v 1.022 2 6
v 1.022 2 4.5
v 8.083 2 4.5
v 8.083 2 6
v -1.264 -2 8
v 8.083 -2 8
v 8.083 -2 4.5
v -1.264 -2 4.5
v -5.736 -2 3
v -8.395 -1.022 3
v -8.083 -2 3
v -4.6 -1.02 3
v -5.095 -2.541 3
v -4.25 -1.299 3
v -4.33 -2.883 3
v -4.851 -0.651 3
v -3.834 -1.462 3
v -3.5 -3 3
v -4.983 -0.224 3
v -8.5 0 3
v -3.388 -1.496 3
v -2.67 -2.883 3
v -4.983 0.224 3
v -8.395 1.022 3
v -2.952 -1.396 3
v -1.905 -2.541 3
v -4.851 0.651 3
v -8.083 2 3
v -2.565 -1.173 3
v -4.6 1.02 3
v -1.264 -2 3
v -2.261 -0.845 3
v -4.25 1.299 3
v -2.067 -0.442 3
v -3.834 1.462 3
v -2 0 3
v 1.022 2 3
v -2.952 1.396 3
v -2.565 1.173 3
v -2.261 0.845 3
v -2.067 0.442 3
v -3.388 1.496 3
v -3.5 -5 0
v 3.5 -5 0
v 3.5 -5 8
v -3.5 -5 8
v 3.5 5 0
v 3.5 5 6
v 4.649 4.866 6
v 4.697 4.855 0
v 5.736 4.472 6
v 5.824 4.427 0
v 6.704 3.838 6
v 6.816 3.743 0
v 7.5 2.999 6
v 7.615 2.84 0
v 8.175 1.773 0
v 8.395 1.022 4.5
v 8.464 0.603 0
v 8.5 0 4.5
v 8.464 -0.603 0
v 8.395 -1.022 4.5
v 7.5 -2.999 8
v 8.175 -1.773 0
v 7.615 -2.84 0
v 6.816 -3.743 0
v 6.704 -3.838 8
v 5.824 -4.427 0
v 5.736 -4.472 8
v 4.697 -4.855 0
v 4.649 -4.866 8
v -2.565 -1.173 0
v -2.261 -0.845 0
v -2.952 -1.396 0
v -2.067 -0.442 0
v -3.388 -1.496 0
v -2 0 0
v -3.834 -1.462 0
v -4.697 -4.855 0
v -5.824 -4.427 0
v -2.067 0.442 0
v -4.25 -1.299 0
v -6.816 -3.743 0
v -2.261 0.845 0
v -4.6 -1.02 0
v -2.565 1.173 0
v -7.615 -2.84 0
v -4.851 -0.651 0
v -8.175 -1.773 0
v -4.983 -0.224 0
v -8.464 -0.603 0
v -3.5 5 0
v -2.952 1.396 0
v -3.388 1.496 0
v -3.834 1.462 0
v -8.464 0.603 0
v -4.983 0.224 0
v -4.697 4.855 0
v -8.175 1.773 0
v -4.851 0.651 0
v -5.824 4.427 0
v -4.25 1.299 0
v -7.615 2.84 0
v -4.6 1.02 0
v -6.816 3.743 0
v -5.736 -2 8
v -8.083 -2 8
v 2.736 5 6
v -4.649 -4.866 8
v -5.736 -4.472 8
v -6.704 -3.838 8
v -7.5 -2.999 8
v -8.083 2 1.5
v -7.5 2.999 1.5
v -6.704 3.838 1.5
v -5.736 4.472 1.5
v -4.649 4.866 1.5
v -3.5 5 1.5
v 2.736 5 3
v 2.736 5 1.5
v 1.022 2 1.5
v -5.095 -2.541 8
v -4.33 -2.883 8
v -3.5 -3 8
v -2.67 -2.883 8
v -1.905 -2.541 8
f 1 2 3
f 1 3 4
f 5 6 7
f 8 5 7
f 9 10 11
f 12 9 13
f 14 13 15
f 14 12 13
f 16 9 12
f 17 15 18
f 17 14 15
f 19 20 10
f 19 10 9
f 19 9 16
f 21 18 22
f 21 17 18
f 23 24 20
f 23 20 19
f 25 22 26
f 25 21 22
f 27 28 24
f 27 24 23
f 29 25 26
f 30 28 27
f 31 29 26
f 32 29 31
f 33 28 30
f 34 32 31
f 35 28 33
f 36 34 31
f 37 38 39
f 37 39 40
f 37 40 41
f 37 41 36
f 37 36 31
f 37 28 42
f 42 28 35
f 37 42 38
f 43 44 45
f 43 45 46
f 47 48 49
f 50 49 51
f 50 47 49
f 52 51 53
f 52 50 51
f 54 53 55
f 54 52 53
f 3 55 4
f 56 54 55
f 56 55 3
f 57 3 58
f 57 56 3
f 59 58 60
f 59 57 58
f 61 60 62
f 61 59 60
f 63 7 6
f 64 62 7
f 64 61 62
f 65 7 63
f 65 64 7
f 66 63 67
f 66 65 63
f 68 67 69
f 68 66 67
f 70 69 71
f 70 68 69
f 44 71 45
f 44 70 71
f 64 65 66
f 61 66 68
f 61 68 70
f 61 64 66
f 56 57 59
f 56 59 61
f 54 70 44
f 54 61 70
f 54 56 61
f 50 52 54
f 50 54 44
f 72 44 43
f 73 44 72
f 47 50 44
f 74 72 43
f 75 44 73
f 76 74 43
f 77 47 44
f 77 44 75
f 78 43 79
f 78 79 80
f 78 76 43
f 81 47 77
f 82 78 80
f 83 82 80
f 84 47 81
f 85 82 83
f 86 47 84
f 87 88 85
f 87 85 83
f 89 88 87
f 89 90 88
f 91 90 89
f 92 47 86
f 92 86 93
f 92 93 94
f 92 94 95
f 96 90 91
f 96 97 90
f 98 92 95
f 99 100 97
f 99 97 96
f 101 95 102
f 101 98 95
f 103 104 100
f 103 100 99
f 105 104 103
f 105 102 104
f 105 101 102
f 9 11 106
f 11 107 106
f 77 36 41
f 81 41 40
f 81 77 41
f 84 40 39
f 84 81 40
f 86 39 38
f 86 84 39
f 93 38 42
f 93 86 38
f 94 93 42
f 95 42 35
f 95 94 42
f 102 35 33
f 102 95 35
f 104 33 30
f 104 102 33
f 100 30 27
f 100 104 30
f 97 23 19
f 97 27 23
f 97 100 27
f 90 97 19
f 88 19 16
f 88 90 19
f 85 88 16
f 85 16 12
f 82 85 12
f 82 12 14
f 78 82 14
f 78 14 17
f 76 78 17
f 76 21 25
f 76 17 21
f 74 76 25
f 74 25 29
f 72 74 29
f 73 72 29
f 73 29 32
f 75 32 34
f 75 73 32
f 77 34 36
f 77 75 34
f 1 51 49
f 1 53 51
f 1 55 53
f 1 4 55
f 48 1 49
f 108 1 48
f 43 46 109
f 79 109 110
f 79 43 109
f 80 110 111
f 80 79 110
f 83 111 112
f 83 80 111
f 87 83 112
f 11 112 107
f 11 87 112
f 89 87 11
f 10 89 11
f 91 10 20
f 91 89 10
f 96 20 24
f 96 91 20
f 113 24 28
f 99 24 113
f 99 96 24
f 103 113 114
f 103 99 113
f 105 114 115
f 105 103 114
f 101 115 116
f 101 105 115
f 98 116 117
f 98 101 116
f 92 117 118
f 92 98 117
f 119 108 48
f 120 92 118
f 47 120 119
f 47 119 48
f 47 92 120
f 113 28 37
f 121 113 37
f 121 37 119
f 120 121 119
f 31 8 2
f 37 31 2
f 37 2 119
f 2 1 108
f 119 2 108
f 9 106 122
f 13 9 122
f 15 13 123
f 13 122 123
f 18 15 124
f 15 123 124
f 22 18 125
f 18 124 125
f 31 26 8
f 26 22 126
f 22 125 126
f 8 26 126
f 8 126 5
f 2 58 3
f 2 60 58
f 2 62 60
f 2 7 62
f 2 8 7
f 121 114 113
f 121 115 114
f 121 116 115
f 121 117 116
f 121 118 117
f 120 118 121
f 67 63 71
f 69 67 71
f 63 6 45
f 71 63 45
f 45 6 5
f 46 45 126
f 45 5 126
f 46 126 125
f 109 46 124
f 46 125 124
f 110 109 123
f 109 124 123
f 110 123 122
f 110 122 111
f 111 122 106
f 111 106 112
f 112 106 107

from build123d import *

# Parameters (mm, degrees)
SKETCH2_R               = 1.5
BOSS_EXTRUDE1_DEPTH     = 8
CUT_EXTRUDE1_DEPTH      = 18
CUT_EXTRUDE1_DEPTH_BACK = 18
CUT_EXTRUDE2_DEPTH      = 5
CUT_EXTRUDE3_DEPTH      = 1.5


with BuildPart() as part:
    # Sketch2 → Boss-Extrude1 (new body)
    with BuildSketch(Plane.XY):
        with BuildLine():
            Line((-3.5, 5), (3.5, 5))
            ThreePointArc((3.5, 5), (8.5, 0), (3.5, -5))
            Line((3.5, -5), (-3.5, -5))
            ThreePointArc((-3.5, -5), (-8.5, 0), (-3.5, 5))
        make_face()
        with Locations((-3.5, 0)):
            Circle(SKETCH2_R, mode=Mode.SUBTRACT)
    extrude(amount=BOSS_EXTRUDE1_DEPTH)

    # Sketch3 → Cut-Extrude1 (cut, two sides: drawn at the far end of the back side and taken through both)
    with BuildSketch(Plane(origin=(0, 0, 0), x_dir=(0, 0, -1), z_dir=(1, 0, 0)).offset(-CUT_EXTRUDE1_DEPTH_BACK)):
        Polygon((-8, -2), (-4.5, -2), (-4.5, 2), (-6, 2), (-6, 5), (-8, 5), align=None)
    extrude(amount=CUT_EXTRUDE1_DEPTH + CUT_EXTRUDE1_DEPTH_BACK, mode=Mode.SUBTRACT)

    # Sketch4 → Cut-Extrude2 (cut)
    with BuildSketch(Plane.XY.offset(8)):
        with BuildLine():
            Line((-1.263932023, -2), (2.736067977, 5))
            Line((2.736067977, 5), (-10.787192153, 5))
            Line((-10.787192153, 5), (-10.787192153, -2))
            Line((-10.787192153, -2), (-5.736067977, -2))
            ThreePointArc((-5.736067977, -2), (-3.5, -3), (-1.263932023, -2))
        make_face()
    extrude(amount=-CUT_EXTRUDE2_DEPTH, mode=Mode.SUBTRACT)

    # Sketch5 → Cut-Extrude3 (cut)
    with BuildSketch(Plane.XY.offset(3)):
        Polygon((1.021782263, 2), (2.736067977, 5), (-9.199414094, 5), (-9.199414094, 2), align=None)
    extrude(amount=-CUT_EXTRUDE3_DEPTH, mode=Mode.SUBTRACT)


solid = part.part
